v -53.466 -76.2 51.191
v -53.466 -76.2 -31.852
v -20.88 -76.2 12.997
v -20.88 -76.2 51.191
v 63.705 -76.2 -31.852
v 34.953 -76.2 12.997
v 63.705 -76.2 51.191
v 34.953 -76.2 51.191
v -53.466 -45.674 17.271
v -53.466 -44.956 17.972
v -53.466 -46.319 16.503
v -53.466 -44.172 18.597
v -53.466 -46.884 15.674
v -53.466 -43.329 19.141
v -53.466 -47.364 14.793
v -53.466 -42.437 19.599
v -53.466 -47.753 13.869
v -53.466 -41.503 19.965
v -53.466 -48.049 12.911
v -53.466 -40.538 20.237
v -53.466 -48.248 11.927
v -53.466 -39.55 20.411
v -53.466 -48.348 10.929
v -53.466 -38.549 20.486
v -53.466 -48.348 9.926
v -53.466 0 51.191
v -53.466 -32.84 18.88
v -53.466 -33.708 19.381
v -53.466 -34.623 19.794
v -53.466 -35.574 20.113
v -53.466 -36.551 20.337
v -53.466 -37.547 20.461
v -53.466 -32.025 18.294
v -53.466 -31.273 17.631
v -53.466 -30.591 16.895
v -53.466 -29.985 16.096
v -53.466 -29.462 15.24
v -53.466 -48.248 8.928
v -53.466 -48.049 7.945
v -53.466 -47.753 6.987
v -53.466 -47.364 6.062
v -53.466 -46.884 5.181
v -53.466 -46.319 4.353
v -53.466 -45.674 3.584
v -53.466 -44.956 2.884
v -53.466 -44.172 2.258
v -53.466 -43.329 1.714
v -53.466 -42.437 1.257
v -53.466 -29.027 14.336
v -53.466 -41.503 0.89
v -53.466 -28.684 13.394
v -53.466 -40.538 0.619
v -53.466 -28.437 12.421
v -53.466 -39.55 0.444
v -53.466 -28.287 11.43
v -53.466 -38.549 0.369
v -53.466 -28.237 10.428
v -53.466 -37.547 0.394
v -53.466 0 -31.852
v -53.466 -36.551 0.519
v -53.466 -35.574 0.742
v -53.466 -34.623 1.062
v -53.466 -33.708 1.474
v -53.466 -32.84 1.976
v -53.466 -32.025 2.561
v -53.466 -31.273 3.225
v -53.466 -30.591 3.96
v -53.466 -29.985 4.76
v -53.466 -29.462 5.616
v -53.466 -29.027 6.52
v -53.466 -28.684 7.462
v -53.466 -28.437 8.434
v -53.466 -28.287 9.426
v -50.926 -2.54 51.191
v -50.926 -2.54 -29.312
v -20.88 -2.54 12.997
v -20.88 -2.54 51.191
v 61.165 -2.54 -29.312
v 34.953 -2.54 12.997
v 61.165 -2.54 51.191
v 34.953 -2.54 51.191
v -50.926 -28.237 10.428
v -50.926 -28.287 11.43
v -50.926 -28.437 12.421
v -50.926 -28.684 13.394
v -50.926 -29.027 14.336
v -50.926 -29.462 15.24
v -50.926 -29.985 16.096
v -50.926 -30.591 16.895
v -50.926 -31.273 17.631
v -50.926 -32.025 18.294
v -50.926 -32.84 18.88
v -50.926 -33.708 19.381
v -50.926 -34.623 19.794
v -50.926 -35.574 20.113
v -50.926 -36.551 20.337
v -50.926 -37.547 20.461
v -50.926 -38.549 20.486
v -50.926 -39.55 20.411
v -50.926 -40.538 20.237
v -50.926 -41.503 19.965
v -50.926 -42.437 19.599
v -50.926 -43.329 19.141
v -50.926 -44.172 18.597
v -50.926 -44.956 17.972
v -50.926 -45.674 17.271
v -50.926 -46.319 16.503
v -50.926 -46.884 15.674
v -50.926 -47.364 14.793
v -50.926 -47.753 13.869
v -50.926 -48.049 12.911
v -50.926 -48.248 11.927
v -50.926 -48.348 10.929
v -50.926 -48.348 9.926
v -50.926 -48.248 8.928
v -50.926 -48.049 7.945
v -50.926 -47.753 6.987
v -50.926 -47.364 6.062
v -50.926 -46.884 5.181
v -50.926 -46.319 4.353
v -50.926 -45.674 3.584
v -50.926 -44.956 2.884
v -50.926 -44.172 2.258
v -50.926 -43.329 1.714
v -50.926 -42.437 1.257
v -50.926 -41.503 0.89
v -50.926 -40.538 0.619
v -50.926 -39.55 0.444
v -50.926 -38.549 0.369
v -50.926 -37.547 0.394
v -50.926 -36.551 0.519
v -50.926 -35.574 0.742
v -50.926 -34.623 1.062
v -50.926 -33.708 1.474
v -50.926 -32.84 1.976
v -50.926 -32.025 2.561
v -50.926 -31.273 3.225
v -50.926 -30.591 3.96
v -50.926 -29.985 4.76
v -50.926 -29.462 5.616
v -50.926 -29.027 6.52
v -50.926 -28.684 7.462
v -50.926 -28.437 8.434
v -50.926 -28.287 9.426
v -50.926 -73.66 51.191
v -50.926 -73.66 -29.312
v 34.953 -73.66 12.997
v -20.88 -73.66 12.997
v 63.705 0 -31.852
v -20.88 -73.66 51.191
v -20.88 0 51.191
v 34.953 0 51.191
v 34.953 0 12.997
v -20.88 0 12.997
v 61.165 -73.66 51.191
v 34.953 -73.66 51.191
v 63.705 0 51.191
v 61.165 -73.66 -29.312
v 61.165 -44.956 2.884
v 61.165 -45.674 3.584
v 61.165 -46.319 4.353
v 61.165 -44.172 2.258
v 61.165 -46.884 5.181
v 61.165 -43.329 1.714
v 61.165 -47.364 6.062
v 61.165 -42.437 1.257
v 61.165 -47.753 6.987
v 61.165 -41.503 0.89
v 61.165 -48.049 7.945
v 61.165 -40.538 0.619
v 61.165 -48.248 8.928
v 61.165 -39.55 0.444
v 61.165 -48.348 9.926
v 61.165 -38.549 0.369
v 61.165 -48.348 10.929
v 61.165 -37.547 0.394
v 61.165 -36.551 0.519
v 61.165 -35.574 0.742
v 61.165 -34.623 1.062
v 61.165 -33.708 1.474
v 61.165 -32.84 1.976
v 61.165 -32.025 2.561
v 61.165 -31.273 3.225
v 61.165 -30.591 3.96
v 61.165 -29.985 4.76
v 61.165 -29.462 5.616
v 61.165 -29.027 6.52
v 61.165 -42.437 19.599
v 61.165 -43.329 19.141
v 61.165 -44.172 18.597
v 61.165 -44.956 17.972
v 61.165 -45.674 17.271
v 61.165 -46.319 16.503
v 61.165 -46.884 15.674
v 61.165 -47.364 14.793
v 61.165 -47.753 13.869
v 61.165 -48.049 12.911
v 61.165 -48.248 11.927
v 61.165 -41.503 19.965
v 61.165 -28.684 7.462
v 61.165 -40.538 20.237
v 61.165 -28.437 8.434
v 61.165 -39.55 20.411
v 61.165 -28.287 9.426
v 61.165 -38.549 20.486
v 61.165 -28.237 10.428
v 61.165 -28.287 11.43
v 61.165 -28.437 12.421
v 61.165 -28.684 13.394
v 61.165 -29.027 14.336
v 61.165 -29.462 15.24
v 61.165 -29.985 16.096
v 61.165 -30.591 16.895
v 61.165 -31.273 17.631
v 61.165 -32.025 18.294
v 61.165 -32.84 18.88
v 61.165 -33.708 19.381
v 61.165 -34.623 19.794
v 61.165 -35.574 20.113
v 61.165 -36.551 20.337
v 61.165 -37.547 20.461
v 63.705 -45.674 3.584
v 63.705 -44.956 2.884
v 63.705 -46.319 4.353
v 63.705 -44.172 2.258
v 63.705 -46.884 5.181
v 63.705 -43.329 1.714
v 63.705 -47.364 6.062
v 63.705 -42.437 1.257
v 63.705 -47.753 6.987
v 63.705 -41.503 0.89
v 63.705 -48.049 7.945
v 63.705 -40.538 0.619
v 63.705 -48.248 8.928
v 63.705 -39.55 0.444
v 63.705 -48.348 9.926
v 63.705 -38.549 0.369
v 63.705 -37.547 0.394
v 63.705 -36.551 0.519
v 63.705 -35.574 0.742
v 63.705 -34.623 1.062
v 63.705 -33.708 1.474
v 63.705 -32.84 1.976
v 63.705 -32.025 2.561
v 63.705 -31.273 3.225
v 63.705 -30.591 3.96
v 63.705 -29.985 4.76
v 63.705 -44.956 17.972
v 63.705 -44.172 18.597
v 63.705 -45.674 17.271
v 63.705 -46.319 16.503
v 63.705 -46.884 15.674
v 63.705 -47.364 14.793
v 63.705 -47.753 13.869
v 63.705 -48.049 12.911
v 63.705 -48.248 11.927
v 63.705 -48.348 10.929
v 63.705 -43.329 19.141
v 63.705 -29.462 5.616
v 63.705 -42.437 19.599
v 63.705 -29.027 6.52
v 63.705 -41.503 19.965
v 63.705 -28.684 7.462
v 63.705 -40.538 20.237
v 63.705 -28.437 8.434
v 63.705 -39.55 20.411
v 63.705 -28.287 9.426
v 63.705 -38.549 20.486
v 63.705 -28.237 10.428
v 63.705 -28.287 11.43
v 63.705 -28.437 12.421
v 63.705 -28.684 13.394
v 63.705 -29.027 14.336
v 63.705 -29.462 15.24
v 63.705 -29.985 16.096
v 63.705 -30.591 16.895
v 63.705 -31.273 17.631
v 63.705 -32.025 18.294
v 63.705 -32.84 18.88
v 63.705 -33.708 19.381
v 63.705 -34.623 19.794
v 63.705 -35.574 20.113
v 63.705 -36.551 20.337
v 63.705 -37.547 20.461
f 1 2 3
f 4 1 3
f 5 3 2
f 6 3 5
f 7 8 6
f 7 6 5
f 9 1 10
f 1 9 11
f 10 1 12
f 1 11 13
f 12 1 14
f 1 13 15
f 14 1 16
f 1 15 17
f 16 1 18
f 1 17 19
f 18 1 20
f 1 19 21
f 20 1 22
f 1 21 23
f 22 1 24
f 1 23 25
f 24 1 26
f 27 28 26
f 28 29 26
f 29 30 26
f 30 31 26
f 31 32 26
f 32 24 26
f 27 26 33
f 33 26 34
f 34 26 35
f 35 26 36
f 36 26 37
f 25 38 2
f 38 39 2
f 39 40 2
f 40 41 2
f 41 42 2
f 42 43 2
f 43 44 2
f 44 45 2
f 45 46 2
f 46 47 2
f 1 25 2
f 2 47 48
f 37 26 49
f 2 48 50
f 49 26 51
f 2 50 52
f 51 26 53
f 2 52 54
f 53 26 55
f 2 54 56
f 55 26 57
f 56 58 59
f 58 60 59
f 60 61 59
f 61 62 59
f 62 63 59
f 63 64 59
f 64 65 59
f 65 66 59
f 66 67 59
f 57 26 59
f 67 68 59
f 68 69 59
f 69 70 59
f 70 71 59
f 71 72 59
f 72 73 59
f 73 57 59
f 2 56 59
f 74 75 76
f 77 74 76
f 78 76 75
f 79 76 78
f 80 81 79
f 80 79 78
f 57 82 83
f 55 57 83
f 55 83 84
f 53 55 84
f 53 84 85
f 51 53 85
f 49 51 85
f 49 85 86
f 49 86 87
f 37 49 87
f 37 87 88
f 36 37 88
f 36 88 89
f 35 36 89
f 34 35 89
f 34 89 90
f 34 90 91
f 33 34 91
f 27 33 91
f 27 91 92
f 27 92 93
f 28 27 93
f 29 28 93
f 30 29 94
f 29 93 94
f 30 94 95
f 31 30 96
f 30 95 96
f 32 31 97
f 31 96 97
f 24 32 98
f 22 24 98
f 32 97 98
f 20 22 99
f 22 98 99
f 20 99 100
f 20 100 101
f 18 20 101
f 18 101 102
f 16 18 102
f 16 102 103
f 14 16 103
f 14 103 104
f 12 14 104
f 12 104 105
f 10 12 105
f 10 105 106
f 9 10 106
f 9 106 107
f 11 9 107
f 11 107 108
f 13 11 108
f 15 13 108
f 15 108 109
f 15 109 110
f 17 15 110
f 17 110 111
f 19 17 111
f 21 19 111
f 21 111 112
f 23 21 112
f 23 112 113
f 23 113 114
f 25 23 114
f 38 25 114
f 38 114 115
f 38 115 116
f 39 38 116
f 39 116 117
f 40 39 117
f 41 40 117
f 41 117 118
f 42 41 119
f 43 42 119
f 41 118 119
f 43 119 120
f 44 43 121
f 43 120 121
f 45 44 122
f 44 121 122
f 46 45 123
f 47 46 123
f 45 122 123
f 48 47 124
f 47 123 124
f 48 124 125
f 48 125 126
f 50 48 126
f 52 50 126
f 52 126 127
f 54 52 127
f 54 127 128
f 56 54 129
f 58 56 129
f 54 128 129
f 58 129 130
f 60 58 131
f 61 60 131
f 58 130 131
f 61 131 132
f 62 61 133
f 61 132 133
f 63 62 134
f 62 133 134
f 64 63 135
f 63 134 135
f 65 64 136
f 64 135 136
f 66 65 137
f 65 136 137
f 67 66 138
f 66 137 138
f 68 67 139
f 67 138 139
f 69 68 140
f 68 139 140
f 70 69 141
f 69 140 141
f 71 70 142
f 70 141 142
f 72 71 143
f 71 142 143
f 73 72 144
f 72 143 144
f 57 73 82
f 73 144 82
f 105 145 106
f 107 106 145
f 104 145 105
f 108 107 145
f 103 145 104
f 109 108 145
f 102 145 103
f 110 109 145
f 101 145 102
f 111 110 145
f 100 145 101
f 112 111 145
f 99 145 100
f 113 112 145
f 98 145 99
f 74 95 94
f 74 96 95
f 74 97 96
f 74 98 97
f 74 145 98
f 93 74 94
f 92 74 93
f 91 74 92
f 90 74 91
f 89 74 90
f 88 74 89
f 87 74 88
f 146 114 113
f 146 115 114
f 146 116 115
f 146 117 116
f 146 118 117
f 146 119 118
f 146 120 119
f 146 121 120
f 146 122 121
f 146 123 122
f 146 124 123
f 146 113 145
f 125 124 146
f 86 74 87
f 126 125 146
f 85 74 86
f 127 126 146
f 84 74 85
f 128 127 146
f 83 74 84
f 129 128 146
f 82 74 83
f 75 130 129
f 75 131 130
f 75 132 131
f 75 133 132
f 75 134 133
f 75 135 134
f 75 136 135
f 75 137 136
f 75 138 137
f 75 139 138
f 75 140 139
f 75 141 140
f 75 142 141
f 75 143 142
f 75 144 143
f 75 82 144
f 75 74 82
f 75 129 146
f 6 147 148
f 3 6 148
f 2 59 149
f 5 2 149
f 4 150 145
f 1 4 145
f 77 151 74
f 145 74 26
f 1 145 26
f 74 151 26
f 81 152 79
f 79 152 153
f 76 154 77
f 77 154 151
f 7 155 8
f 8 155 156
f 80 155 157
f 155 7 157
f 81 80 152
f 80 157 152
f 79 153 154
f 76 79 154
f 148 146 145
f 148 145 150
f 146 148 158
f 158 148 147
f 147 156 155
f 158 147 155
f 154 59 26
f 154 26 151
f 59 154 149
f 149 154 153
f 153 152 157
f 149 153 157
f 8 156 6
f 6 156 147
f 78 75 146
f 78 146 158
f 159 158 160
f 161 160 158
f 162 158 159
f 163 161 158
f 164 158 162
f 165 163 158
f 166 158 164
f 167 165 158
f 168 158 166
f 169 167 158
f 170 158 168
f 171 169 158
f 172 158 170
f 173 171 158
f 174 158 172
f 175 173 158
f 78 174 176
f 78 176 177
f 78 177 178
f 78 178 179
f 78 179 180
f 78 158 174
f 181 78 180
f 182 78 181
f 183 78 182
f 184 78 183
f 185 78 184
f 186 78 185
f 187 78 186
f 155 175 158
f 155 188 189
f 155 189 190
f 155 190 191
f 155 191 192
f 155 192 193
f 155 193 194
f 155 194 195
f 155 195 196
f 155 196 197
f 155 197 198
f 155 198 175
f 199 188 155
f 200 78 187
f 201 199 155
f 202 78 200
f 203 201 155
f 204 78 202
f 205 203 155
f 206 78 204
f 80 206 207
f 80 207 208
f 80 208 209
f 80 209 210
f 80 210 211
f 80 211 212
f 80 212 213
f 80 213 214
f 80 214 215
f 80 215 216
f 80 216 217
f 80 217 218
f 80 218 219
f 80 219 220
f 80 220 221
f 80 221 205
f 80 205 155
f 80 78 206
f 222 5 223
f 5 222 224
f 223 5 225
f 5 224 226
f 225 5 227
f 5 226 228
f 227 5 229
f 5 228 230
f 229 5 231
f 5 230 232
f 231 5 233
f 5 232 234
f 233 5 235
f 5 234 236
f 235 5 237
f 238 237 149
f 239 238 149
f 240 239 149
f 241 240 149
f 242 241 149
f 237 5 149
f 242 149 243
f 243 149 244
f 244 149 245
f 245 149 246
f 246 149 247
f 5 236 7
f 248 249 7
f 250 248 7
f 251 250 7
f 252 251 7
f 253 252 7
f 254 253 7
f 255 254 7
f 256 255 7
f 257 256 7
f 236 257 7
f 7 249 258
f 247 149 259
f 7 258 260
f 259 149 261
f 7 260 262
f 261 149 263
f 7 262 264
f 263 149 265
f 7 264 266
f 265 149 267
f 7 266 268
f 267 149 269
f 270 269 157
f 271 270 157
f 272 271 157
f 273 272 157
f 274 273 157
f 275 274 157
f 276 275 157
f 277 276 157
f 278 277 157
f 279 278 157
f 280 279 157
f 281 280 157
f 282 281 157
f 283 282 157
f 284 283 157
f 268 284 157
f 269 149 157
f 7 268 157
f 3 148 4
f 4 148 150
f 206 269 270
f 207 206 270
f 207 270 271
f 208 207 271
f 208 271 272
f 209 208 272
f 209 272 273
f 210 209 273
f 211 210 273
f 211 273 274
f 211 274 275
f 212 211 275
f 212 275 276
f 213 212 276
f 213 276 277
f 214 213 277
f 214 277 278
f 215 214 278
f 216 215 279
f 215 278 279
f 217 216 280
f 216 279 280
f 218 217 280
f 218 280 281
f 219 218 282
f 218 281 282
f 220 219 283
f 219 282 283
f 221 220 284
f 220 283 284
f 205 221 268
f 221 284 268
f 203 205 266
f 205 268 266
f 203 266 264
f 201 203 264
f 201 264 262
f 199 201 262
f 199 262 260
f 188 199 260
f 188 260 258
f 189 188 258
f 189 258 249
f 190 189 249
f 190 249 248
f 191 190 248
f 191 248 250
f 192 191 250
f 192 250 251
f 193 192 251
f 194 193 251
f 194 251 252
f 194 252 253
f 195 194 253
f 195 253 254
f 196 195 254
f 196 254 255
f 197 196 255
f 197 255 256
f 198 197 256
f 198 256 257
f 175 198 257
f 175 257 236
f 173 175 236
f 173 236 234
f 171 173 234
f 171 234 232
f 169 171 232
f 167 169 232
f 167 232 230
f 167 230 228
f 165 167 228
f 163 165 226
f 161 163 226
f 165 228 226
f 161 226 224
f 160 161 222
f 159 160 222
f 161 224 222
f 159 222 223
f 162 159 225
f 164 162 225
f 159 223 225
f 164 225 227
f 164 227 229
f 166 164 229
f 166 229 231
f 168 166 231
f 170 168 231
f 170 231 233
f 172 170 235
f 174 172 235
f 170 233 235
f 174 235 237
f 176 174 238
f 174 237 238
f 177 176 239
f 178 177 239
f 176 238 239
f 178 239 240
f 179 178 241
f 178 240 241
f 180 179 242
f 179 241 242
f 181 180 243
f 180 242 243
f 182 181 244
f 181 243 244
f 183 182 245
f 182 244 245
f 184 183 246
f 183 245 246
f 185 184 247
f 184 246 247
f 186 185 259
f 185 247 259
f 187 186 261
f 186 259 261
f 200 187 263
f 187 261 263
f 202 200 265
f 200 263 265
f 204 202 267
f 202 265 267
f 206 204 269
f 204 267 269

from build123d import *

# Parameters (mm, degrees)
F1_DEPTH = 76.2
F2_T     = -2.54
F3_R     = 10.061541377
F4_DEPTH = 117.1720453928


with BuildPart() as f1:
    # F0 (on Front) → F1 (new body)
    with BuildSketch(Plane.XZ):
        Polygon((-20.8796709776, 51.1912330985), (-53.4663982689, 51.1912330985), (-53.4663982689, -31.8523235619), (63.7046471238, -31.8523235619), (63.7046471238, 51.1912330985), (34.9526293576, 51.1912330985), (34.9526293576, 12.9971429706), (-20.8796709776, 12.9971429706), align=None)
    extrude(amount=F1_DEPTH)

    # F2
    f2_openings = [f1.faces().sort_by_distance(p)[0] for p in [
        (-37.173035, -38.1, 51.191233),
        (49.328638, -38.1, 51.191233),
        (-20.879671, -38.1, 32.094188),
        (7.036479, -38.1, 12.997143),
        (34.952629, -38.1, 32.094188),
    ]]
    offset(amount=F2_T, openings=f2_openings)

    # F3 (on face) → F4 (cut, through all)
    with BuildSketch(Plane.YZ.offset(63.7046471238)):
        with Locations((-38.298625499, 10.4278437793)):
            Circle(F3_R)
    extrude(amount=-F4_DEPTH, mode=Mode.SUBTRACT)


solid = f1.part
